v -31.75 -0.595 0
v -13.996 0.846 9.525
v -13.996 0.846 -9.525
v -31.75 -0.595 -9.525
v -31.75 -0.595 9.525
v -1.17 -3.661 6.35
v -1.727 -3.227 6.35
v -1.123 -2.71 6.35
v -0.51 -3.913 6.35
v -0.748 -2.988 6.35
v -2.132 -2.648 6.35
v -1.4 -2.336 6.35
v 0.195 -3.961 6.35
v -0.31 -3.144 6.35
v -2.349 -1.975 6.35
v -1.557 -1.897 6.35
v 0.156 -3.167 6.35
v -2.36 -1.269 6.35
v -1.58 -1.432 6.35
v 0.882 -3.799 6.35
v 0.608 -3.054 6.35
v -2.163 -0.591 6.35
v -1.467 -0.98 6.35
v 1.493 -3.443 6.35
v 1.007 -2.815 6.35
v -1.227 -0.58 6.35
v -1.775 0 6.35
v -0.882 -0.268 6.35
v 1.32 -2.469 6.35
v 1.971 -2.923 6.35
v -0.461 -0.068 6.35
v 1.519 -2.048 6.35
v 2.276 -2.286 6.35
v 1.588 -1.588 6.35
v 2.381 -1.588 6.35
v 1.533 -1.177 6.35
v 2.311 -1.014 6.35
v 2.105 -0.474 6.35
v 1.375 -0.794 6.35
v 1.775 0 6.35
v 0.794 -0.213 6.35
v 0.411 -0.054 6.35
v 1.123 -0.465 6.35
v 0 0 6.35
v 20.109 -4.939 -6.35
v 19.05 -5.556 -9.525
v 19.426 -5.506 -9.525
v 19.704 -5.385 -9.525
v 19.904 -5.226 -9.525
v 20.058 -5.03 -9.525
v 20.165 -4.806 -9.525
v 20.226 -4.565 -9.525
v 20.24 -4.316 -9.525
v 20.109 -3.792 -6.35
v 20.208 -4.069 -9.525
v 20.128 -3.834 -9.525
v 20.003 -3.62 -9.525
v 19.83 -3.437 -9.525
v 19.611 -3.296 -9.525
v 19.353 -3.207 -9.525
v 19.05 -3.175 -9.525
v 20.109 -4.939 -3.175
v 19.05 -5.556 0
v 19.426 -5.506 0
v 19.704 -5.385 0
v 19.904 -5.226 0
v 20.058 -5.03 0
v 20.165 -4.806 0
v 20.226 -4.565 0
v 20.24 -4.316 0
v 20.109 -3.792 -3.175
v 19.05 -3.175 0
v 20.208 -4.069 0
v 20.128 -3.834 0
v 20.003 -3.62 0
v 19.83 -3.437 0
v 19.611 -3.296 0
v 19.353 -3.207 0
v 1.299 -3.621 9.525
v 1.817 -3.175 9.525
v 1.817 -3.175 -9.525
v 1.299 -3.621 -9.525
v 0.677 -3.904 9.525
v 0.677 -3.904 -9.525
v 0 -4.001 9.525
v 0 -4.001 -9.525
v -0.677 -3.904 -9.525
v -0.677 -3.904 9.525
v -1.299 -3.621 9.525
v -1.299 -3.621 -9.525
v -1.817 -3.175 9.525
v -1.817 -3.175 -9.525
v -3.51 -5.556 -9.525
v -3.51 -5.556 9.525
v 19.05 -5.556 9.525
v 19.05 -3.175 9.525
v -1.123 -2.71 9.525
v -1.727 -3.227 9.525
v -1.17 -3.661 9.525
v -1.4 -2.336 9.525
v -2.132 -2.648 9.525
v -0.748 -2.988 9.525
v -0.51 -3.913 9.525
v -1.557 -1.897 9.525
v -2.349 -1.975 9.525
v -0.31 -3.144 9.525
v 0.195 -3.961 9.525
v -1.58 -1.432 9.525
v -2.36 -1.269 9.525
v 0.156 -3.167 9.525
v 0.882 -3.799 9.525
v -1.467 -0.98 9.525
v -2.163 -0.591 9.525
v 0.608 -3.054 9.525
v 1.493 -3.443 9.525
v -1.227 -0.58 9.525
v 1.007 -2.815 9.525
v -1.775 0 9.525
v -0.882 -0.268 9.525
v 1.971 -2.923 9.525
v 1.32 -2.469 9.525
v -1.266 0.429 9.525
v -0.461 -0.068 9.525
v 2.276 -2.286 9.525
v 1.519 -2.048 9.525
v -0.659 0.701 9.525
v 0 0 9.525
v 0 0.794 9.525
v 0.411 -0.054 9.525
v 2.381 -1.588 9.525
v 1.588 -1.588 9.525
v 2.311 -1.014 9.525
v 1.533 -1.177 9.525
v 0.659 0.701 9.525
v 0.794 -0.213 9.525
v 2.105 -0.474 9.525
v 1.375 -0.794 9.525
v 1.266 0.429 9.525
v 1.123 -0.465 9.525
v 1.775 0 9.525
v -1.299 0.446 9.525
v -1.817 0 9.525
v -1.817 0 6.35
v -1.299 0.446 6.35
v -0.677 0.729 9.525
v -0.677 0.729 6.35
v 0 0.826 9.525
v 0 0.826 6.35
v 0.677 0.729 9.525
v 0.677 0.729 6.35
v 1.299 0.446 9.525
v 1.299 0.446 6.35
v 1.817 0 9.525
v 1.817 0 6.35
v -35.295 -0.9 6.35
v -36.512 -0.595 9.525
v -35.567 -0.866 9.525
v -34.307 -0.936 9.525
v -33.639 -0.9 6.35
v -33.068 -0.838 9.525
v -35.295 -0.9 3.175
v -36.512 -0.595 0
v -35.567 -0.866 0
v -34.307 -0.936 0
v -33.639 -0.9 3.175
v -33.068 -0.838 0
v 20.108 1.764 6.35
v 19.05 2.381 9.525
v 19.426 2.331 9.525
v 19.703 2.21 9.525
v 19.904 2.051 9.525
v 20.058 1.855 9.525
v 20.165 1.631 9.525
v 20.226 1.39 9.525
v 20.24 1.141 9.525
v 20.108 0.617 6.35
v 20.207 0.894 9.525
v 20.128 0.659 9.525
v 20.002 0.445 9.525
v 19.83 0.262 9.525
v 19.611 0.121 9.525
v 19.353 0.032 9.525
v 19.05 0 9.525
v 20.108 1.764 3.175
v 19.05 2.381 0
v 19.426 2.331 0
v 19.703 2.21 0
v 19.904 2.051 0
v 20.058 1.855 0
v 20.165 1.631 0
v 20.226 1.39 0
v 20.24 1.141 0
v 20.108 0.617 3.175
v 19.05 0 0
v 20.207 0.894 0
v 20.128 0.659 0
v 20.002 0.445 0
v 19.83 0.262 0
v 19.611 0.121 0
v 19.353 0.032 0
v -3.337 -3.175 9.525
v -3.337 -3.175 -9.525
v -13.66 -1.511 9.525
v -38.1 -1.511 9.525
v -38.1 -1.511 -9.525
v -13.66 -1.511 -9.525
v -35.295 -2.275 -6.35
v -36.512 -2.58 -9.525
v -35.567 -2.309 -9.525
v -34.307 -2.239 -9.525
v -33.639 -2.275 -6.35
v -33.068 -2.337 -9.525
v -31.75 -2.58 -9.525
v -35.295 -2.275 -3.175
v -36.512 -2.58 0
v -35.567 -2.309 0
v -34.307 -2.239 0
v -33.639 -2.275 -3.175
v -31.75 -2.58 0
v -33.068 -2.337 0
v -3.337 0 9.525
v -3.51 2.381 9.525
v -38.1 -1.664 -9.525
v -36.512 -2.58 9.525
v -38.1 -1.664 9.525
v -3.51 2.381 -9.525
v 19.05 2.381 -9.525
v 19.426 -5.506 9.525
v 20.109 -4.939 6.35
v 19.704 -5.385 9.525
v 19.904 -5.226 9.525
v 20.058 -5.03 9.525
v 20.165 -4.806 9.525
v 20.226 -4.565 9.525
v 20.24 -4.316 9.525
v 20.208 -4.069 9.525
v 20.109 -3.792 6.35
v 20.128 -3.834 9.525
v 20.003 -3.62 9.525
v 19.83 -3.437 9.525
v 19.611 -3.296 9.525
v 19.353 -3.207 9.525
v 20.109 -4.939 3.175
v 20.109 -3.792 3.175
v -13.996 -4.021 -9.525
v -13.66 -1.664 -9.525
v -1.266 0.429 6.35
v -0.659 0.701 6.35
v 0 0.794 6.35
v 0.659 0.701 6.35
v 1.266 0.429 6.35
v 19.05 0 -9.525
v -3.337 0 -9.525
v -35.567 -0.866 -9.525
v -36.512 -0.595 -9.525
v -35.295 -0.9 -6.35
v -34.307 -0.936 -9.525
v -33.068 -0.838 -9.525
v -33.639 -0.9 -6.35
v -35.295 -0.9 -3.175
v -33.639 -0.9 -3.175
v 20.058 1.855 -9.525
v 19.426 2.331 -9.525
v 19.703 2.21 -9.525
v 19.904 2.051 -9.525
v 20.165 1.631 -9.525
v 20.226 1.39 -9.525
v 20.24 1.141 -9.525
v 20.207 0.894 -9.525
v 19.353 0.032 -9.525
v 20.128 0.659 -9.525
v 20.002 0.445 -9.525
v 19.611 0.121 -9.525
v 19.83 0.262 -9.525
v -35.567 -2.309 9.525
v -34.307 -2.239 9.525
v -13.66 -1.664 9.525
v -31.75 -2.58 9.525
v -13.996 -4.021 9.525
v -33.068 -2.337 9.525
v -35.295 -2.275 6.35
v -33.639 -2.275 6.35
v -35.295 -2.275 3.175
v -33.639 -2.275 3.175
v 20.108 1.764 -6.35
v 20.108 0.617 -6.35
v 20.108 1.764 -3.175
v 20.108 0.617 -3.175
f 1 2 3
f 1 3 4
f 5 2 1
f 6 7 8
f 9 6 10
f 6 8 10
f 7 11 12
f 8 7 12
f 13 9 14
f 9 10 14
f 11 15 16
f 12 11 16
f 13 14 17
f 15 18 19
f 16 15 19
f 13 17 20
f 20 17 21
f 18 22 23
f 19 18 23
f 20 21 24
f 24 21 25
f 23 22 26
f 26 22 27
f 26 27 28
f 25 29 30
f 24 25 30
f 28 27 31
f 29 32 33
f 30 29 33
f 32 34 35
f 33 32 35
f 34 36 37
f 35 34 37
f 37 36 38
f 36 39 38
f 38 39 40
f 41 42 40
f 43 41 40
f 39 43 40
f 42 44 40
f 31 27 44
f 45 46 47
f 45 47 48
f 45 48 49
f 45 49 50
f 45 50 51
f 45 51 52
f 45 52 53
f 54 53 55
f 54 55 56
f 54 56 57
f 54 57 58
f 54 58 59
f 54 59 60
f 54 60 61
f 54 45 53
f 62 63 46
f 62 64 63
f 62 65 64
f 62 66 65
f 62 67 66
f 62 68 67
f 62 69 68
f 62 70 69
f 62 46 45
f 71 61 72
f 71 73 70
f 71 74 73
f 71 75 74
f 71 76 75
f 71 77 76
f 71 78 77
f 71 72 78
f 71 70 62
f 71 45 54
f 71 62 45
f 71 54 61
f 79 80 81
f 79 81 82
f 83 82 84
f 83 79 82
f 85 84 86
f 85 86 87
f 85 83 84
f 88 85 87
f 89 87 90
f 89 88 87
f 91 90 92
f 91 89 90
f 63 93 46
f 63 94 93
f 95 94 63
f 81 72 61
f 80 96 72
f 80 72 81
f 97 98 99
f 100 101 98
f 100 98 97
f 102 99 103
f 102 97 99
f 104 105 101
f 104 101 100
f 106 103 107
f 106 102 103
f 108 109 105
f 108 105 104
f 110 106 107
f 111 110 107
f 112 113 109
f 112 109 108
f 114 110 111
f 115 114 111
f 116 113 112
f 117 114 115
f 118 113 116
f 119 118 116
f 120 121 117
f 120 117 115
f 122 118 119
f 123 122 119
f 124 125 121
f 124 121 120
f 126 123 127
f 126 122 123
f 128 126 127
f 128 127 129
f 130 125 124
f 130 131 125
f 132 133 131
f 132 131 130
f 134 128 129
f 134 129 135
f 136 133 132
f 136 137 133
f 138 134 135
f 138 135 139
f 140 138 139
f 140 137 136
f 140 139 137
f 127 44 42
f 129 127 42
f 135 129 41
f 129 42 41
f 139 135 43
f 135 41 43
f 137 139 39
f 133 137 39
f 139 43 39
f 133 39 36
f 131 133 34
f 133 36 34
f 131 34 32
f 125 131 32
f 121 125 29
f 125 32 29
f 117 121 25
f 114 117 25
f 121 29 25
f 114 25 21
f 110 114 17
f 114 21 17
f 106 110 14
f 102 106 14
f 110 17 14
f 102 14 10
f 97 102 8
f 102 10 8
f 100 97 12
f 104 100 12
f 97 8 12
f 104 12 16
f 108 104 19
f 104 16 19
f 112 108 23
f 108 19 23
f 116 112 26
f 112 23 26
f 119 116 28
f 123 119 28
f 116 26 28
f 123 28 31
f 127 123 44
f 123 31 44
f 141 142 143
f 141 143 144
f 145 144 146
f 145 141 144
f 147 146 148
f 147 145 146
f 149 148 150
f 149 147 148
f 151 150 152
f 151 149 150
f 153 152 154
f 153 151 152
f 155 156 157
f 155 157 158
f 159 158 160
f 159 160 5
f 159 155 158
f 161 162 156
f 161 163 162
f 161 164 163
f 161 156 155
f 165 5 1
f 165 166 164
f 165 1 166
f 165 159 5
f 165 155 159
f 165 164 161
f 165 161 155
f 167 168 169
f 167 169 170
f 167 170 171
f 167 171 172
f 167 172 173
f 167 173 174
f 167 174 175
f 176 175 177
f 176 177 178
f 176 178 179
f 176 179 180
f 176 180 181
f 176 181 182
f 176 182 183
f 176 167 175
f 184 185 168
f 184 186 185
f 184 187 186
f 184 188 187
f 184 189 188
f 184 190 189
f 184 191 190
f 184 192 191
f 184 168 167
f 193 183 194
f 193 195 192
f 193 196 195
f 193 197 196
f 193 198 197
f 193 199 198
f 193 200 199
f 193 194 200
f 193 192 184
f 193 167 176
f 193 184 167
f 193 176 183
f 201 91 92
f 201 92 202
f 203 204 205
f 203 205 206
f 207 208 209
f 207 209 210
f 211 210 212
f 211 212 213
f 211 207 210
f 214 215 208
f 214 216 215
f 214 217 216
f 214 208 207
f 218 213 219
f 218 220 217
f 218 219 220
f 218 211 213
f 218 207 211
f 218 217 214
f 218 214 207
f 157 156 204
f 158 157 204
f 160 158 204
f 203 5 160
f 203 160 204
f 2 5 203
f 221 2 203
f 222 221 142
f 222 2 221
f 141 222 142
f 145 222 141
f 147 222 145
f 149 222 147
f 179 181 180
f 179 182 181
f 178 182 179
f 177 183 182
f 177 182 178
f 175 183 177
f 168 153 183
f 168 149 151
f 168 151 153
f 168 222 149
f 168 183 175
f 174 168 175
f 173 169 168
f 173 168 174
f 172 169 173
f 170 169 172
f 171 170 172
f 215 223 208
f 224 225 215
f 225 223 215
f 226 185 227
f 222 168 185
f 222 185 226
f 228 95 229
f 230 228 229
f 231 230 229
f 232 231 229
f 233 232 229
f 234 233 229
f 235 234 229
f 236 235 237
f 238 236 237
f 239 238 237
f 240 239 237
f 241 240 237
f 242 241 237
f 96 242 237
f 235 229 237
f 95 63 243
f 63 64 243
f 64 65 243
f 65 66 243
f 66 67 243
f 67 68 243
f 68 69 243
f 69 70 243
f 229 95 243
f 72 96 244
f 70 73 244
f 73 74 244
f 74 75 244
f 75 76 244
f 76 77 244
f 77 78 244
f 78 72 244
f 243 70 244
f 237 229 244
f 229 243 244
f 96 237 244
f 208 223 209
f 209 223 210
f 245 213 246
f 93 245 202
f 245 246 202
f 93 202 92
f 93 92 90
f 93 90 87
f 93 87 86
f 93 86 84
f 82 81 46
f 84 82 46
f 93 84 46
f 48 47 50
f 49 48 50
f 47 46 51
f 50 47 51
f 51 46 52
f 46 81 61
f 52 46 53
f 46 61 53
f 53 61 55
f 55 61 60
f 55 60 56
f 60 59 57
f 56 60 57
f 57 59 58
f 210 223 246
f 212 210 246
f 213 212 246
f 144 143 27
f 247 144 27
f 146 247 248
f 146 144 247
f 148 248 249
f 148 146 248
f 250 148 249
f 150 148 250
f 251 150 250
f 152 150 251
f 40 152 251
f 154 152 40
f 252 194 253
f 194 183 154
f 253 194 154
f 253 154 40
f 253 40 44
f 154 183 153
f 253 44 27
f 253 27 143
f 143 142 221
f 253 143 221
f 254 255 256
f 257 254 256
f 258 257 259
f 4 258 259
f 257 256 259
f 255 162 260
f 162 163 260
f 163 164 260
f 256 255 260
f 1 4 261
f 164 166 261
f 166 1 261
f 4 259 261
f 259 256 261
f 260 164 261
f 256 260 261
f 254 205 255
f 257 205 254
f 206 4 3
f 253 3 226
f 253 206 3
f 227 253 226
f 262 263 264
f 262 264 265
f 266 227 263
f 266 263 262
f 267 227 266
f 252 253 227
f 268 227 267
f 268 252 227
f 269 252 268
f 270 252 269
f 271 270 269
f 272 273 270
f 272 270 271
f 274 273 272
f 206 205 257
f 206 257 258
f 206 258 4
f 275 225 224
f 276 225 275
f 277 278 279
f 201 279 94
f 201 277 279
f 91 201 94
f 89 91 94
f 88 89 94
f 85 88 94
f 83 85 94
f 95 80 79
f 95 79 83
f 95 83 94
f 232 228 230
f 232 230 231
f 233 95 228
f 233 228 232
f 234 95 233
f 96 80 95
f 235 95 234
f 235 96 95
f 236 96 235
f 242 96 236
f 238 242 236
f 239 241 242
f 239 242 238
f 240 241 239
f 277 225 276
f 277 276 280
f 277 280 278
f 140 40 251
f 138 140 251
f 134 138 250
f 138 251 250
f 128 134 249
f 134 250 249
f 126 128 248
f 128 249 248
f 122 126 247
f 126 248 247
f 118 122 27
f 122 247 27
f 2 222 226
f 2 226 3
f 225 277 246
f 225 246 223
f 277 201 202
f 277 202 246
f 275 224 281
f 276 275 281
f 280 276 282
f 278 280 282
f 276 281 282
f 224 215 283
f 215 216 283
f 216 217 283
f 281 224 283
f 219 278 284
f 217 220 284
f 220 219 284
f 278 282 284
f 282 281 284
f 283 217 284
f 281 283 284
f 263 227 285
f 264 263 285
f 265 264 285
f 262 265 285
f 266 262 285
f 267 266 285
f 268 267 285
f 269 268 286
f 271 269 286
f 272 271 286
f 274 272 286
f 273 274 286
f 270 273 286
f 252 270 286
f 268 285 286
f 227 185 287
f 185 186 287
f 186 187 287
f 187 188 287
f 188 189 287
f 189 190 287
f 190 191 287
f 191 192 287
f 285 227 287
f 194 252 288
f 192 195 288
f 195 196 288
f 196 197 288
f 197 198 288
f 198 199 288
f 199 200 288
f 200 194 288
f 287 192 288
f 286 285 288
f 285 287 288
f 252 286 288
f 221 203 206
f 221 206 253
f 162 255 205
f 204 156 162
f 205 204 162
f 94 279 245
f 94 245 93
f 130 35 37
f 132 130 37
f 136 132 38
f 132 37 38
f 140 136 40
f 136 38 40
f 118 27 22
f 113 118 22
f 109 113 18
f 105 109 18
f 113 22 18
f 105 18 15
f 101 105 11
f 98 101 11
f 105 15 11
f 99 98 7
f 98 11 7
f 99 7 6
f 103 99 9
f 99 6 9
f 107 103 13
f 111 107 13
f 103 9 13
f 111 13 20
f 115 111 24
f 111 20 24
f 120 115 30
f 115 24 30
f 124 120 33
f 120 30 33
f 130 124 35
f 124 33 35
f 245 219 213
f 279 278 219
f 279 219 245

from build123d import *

# Parameters (mm, degrees)
F1_DEPTH = 9.525
F2_DEPTH = 6.35
F5_DEPTH = 3.175
F9_DEPTH = 3.175


# Not quite as in the source:
# - a feature of the source that left no trace in its solid (it failed there, or was rolled back) is left out


with BuildPart() as f1:
    # F0 (on Top) → F1 (new body, symmetric)
    with BuildSketch(Plane.XY):
        with BuildLine():
            Line((19.0503296435, -3.175), (1.8172541787, -3.175))
            ThreePointArc((1.8172541787, -3.175), (0, -4.0005), (-1.8172541787, -3.175))
            Line((-1.8172541787, -3.175), (-3.3368981663, -3.175))
            Line((-3.3368981663, -3.175), (-13.6596335379, -1.6637))
            Line((-13.6596335379, -1.6637), (-38.1, -1.6637))
            Line((-38.1, -1.6637), (-36.5125, -2.5802435523))
            add(Edge.make_bspline(
                [(-36.5125, -2.5802435523), (-35.5840288103, -2.1219717762), (-33.6853526533, -2.1219717762), (-31.75, -2.5802435523)],
                knots=[0, 0, 0, 0, 4.7625, 4.7625, 4.7625, 4.7625], degree=3))
            Line((-31.75, -2.5802435523), (-13.9957684352, -4.0211232241))
            Line((-13.9957684352, -4.0211232241), (-3.5102874127, -5.55625))
            Line((-3.5102874127, -5.55625), (19.0503296435, -5.55625))
            add(Edge.make_bspline(
                [(19.0503296435, -5.55625), (20.6378296435, -5.55625), (20.6378296435, -3.175), (19.0503296435, -3.175)],
                knots=[0, 0, 0, 0, 2.38125, 2.38125, 2.38125, 2.38125], degree=3))
        make_face()
    extrude(amount=F1_DEPTH, both=True)


with BuildPart() as f1b:
    # F0 (on Top) → F1, piece 2 (new body, symmetric)
    with BuildSketch(Plane.XY):
        with BuildLine():
            Line((1.8172541787, 0), (19.05, 0))
            add(Edge.make_bspline(
                [(19.05, 2.38125), (20.6375, 2.38125), (20.6375, 0), (19.05, 0)],
                knots=[0, 0, 0, 0, 2.38125, 2.38125, 2.38125, 2.38125], degree=3))
            Line((19.05, 2.38125), (-3.5102874127, 2.38125))
            Line((-3.5102874127, 2.38125), (-13.9957684352, 0.8461232241))
            Line((-13.9957684352, 0.8461232241), (-31.75, -0.5947564477))
            add(Edge.make_bspline(
                [(-36.5125, -0.5947564477), (-35.5840288103, -1.0530282238), (-33.6853526533, -1.0530282238), (-31.75, -0.5947564477)],
                knots=[0, 0, 0, 0, 4.7625, 4.7625, 4.7625, 4.7625], degree=3))
            Line((-36.5125, -0.5947564477), (-38.1, -1.5113))
            Line((-38.1, -1.5113), (-13.6596335379, -1.5113))
            Line((-13.6596335379, -1.5113), (-3.3368981663, 0))
            Line((-3.3368981663, 0), (-1.8172541787, 0))
            ThreePointArc((-1.8172541787, 0), (0, 0.8255), (1.8172541787, 0))
        make_face()
    extrude(amount=F1_DEPTH, both=True)

    # F0 (on Top) → F2 (join, symmetric)
    with BuildSketch(Plane.XY):
        with BuildLine():
            Line((0, 0), (1.7748789571, 0))
            ThreePointArc((1.7748789571, 0), (0, 0.79375), (-1.7748789571, 0))
            Line((-1.7748789571, 0), (0, 0))
        make_face()
        with BuildLine():
            Line((1.7748789571, 0), (1.8172541787, 0))
            ThreePointArc((1.8172541787, 0), (0, 0.8255), (-1.8172541787, 0))
            Line((-1.8172541787, 0), (-1.7748789571, 0))
            ThreePointArc((-1.7748789571, 0), (0, 0.79375), (1.7748789571, 0))
        make_face()
    extrude(amount=F2_DEPTH, both=True)

    # F3: union 

    # F4 (on face) → F5 (join)
    with BuildSketch(Plane.XY.offset(6.35)):
        with BuildLine():
            ThreePointArc((-1.7748789571, 0), (-0.8496826013, -3.8119979298), (2.38125, -1.5875))
            ThreePointArc((2.38125, -1.5875), (2.2244979298, -0.7378173987), (1.7748789571, 0))
            Line((1.7748789571, 0), (0, 0))
            Line((0, 0), (-1.7748789571, 0))
        make_face()
        with BuildLine():
            ThreePointArc((1.5875, -1.5875), (-1.1225320151, -2.7100320151), (0, 0))
            ThreePointArc((0, 0), (1.1225320151, -0.4649679849), (1.5875, -1.5875))
        make_face(mode=Mode.SUBTRACT)
        with BuildLine():
            Line((0, 0), (1.7748789571, 0))
            ThreePointArc((1.7748789571, 0), (0, 0.79375), (-1.7748789571, 0))
            Line((-1.7748789571, 0), (0, 0))
        make_face()
    extrude(amount=F5_DEPTH)

    # F8 (on face) → F9 (join)
    with BuildSketch(Plane(origin=(0, 0, -6.35), x_dir=(1, 0, 0), z_dir=(0, 0, -1))):
        with BuildLine():
            Line((-3e-10, 0), (-1.7748789571, 0))
            ThreePointArc((-1.7748789571, 0), (0, -0.79375), (1.7748789571, 0))
            Line((1.7748789571, 0), (-3e-10, 0))
        make_face()
        with BuildLine():
            ThreePointArc((1.7748789571, 0), (0, -0.79375), (-1.7748789571, 0))
            Line((-1.7748789571, 0), (-1.8172541787, 0))
            ThreePointArc((-1.8172541787, 0), (0, -0.8255), (1.8172541787, 0))
            Line((1.8172541787, 0), (1.7748789571, 0))
        make_face()
    extrude(amount=F9_DEPTH)


solid = Compound([f1.part, f1b.part])
